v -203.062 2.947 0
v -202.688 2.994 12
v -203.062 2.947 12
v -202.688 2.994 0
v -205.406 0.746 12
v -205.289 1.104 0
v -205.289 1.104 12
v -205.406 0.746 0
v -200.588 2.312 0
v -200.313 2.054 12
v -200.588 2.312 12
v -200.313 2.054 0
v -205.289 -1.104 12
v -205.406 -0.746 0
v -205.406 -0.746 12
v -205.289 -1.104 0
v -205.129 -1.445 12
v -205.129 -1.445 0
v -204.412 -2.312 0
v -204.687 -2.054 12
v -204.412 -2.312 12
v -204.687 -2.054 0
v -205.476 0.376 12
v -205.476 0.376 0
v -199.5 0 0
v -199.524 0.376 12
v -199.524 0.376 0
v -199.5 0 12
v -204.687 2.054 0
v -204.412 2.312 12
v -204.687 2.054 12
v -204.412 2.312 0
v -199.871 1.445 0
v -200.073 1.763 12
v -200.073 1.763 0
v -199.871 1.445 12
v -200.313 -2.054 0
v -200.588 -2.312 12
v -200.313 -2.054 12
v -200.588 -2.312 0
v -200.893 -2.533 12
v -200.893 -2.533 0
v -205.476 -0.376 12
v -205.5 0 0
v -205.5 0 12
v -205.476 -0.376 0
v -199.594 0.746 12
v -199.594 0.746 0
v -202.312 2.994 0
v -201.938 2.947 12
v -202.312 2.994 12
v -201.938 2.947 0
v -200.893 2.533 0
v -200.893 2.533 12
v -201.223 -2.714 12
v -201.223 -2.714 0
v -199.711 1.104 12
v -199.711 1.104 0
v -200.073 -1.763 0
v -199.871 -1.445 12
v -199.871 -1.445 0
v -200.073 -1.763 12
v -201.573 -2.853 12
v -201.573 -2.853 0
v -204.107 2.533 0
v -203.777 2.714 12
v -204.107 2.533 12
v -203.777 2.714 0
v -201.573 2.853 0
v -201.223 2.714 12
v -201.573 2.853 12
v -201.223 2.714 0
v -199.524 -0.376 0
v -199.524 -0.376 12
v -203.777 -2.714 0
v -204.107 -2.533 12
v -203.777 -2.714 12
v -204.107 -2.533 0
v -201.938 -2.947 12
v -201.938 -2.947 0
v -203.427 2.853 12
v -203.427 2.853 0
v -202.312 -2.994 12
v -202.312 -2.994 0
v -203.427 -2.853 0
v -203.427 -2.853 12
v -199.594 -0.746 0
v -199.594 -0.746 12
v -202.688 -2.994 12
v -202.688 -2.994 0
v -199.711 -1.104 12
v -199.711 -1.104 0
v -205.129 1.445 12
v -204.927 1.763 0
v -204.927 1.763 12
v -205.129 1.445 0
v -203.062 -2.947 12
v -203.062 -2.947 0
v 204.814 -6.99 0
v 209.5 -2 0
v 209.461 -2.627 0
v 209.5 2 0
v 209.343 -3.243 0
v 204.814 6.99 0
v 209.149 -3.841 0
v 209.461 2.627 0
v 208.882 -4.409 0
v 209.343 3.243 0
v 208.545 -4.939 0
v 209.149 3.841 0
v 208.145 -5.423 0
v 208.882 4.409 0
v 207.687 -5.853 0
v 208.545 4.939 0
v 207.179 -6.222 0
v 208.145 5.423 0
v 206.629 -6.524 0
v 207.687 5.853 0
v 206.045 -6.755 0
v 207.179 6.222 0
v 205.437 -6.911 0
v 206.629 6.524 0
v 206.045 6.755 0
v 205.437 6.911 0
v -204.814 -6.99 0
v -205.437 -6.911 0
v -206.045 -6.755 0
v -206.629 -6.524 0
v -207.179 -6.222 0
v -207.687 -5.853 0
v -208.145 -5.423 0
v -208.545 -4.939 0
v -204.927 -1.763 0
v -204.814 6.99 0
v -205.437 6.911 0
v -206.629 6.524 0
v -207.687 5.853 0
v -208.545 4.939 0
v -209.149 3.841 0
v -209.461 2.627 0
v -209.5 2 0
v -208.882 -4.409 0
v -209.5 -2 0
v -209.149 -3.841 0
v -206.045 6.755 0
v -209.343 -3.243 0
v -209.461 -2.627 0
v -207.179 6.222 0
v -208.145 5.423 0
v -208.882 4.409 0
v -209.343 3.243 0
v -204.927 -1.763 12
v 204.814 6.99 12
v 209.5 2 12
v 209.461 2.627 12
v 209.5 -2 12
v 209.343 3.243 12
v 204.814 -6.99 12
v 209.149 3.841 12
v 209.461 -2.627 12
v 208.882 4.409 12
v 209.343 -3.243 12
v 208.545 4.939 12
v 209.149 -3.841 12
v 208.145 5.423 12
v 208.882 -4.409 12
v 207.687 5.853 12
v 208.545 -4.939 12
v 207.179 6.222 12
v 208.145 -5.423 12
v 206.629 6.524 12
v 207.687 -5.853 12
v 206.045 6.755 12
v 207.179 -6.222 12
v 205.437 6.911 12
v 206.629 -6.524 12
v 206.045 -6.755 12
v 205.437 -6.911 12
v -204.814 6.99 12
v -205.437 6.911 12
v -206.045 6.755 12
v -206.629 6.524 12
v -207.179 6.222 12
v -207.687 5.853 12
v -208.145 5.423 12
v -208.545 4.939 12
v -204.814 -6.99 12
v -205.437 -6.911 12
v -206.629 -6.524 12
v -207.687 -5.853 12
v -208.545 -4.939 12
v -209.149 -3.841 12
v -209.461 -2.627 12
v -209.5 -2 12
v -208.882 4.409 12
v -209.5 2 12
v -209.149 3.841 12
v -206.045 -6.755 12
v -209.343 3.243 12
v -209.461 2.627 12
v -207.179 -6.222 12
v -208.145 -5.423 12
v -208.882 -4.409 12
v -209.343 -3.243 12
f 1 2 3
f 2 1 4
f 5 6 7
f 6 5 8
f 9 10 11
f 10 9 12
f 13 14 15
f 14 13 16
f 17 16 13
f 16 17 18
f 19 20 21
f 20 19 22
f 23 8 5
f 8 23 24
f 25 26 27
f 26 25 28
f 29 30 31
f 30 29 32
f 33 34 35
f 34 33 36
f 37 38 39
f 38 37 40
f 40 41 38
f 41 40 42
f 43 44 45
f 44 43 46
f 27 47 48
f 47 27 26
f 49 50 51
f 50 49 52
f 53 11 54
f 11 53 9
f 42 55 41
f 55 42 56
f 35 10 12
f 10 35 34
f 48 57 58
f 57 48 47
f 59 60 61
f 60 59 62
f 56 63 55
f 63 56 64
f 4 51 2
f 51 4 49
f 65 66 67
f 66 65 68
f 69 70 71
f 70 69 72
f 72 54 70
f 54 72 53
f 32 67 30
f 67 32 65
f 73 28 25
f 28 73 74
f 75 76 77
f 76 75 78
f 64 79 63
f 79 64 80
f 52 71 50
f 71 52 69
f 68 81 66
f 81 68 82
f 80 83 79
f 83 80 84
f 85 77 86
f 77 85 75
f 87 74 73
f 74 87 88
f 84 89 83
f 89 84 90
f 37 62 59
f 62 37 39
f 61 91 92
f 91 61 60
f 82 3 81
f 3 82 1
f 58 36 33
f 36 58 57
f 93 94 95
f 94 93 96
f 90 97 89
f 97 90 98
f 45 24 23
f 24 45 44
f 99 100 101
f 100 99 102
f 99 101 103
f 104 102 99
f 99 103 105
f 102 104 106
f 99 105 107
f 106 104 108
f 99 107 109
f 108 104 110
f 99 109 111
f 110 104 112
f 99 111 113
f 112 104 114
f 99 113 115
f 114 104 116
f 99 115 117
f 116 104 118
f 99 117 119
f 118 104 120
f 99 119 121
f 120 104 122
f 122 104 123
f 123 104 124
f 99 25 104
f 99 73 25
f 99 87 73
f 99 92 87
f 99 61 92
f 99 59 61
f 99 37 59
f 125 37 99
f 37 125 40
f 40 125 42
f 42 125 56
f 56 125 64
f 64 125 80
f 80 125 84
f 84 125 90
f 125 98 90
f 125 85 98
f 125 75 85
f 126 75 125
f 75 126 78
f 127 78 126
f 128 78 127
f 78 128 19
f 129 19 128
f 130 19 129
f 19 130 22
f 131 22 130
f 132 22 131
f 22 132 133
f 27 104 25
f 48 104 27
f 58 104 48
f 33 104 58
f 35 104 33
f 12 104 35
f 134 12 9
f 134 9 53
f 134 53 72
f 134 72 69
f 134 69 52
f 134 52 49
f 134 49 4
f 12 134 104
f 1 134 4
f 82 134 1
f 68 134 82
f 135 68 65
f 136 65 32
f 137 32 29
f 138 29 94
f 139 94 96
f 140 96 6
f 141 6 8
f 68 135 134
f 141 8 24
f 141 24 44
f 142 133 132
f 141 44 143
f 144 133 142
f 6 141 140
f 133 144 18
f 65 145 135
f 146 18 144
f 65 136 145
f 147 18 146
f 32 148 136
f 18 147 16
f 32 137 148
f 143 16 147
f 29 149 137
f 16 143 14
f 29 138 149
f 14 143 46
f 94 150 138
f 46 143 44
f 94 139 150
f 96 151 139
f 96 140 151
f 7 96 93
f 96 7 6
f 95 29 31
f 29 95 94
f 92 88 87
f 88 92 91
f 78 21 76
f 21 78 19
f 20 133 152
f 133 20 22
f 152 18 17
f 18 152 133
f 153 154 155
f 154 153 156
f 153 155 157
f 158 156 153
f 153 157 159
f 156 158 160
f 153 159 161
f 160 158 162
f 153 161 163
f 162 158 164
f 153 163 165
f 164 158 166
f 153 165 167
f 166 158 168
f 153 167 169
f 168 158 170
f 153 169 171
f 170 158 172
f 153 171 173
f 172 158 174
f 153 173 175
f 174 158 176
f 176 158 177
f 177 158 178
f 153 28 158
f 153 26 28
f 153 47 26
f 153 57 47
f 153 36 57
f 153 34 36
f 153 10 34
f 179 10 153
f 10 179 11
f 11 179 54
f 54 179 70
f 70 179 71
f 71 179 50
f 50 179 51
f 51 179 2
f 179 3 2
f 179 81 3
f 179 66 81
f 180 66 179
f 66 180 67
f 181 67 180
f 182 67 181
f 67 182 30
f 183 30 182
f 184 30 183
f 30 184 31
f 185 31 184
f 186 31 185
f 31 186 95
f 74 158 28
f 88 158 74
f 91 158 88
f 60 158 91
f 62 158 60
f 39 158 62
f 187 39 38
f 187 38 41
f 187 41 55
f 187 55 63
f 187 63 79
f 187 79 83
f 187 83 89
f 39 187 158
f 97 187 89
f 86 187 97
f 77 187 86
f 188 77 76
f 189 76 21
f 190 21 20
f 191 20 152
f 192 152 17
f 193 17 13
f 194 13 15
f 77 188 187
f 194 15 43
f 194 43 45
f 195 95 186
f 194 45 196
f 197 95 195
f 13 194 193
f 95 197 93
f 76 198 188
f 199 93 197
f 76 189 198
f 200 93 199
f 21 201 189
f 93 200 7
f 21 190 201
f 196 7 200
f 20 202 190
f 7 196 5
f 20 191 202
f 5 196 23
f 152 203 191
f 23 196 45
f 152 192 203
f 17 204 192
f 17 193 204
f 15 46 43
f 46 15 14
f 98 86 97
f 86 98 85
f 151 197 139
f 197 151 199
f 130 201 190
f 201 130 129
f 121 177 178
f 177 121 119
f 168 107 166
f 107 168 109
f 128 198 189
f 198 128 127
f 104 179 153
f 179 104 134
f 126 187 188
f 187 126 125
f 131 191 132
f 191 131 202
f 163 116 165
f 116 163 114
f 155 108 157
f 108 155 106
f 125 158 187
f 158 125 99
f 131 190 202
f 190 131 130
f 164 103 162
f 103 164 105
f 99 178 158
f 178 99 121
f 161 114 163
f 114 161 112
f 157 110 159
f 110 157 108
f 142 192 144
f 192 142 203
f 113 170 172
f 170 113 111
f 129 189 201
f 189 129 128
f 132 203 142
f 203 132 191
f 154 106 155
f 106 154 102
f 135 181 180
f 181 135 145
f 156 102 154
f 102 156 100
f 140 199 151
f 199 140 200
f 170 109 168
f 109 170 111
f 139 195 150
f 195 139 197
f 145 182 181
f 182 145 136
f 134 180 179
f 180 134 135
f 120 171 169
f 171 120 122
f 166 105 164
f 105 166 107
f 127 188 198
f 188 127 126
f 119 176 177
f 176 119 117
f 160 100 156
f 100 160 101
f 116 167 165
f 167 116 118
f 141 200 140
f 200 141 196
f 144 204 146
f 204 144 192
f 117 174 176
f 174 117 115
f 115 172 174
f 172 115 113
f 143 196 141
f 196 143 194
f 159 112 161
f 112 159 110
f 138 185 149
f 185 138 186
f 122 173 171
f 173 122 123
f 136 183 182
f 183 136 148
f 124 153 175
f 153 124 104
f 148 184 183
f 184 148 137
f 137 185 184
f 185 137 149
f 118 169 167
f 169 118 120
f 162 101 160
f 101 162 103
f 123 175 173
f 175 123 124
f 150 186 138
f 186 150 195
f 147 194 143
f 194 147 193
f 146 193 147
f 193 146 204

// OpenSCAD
$fn = 50;


difference() {
	union() {
		hull() {
			translate(v = [-204.5000000000, 2.0000000000, 0]) {
				cylinder(h = 12, r = 5);
			}
			translate(v = [204.5000000000, 2.0000000000, 0]) {
				cylinder(h = 12, r = 5);
			}
			translate(v = [-204.5000000000, -2.0000000000, 0]) {
				cylinder(h = 12, r = 5);
			}
			translate(v = [204.5000000000, -2.0000000000, 0]) {
				cylinder(h = 12, r = 5);
			}
		}
	}
	union() {
		translate(v = [-202.5000000000, 0.0000000000, 0]) {
			cylinder(h = 12, r = 3.0000000000);
		}
		translate(v = [-202.5000000000, 0.0000000000, 0]) {
			cylinder(h = 12, r = 1.5000000000);
		}
		translate(v = [-202.5000000000, 0.0000000000, 0]) {
			cylinder(h = 12, r = 1.5000000000);
		}
		translate(v = [-202.5000000000, 0.0000000000, 0]) {
			cylinder(h = 12, r = 1.5000000000);
		}
	}
}
